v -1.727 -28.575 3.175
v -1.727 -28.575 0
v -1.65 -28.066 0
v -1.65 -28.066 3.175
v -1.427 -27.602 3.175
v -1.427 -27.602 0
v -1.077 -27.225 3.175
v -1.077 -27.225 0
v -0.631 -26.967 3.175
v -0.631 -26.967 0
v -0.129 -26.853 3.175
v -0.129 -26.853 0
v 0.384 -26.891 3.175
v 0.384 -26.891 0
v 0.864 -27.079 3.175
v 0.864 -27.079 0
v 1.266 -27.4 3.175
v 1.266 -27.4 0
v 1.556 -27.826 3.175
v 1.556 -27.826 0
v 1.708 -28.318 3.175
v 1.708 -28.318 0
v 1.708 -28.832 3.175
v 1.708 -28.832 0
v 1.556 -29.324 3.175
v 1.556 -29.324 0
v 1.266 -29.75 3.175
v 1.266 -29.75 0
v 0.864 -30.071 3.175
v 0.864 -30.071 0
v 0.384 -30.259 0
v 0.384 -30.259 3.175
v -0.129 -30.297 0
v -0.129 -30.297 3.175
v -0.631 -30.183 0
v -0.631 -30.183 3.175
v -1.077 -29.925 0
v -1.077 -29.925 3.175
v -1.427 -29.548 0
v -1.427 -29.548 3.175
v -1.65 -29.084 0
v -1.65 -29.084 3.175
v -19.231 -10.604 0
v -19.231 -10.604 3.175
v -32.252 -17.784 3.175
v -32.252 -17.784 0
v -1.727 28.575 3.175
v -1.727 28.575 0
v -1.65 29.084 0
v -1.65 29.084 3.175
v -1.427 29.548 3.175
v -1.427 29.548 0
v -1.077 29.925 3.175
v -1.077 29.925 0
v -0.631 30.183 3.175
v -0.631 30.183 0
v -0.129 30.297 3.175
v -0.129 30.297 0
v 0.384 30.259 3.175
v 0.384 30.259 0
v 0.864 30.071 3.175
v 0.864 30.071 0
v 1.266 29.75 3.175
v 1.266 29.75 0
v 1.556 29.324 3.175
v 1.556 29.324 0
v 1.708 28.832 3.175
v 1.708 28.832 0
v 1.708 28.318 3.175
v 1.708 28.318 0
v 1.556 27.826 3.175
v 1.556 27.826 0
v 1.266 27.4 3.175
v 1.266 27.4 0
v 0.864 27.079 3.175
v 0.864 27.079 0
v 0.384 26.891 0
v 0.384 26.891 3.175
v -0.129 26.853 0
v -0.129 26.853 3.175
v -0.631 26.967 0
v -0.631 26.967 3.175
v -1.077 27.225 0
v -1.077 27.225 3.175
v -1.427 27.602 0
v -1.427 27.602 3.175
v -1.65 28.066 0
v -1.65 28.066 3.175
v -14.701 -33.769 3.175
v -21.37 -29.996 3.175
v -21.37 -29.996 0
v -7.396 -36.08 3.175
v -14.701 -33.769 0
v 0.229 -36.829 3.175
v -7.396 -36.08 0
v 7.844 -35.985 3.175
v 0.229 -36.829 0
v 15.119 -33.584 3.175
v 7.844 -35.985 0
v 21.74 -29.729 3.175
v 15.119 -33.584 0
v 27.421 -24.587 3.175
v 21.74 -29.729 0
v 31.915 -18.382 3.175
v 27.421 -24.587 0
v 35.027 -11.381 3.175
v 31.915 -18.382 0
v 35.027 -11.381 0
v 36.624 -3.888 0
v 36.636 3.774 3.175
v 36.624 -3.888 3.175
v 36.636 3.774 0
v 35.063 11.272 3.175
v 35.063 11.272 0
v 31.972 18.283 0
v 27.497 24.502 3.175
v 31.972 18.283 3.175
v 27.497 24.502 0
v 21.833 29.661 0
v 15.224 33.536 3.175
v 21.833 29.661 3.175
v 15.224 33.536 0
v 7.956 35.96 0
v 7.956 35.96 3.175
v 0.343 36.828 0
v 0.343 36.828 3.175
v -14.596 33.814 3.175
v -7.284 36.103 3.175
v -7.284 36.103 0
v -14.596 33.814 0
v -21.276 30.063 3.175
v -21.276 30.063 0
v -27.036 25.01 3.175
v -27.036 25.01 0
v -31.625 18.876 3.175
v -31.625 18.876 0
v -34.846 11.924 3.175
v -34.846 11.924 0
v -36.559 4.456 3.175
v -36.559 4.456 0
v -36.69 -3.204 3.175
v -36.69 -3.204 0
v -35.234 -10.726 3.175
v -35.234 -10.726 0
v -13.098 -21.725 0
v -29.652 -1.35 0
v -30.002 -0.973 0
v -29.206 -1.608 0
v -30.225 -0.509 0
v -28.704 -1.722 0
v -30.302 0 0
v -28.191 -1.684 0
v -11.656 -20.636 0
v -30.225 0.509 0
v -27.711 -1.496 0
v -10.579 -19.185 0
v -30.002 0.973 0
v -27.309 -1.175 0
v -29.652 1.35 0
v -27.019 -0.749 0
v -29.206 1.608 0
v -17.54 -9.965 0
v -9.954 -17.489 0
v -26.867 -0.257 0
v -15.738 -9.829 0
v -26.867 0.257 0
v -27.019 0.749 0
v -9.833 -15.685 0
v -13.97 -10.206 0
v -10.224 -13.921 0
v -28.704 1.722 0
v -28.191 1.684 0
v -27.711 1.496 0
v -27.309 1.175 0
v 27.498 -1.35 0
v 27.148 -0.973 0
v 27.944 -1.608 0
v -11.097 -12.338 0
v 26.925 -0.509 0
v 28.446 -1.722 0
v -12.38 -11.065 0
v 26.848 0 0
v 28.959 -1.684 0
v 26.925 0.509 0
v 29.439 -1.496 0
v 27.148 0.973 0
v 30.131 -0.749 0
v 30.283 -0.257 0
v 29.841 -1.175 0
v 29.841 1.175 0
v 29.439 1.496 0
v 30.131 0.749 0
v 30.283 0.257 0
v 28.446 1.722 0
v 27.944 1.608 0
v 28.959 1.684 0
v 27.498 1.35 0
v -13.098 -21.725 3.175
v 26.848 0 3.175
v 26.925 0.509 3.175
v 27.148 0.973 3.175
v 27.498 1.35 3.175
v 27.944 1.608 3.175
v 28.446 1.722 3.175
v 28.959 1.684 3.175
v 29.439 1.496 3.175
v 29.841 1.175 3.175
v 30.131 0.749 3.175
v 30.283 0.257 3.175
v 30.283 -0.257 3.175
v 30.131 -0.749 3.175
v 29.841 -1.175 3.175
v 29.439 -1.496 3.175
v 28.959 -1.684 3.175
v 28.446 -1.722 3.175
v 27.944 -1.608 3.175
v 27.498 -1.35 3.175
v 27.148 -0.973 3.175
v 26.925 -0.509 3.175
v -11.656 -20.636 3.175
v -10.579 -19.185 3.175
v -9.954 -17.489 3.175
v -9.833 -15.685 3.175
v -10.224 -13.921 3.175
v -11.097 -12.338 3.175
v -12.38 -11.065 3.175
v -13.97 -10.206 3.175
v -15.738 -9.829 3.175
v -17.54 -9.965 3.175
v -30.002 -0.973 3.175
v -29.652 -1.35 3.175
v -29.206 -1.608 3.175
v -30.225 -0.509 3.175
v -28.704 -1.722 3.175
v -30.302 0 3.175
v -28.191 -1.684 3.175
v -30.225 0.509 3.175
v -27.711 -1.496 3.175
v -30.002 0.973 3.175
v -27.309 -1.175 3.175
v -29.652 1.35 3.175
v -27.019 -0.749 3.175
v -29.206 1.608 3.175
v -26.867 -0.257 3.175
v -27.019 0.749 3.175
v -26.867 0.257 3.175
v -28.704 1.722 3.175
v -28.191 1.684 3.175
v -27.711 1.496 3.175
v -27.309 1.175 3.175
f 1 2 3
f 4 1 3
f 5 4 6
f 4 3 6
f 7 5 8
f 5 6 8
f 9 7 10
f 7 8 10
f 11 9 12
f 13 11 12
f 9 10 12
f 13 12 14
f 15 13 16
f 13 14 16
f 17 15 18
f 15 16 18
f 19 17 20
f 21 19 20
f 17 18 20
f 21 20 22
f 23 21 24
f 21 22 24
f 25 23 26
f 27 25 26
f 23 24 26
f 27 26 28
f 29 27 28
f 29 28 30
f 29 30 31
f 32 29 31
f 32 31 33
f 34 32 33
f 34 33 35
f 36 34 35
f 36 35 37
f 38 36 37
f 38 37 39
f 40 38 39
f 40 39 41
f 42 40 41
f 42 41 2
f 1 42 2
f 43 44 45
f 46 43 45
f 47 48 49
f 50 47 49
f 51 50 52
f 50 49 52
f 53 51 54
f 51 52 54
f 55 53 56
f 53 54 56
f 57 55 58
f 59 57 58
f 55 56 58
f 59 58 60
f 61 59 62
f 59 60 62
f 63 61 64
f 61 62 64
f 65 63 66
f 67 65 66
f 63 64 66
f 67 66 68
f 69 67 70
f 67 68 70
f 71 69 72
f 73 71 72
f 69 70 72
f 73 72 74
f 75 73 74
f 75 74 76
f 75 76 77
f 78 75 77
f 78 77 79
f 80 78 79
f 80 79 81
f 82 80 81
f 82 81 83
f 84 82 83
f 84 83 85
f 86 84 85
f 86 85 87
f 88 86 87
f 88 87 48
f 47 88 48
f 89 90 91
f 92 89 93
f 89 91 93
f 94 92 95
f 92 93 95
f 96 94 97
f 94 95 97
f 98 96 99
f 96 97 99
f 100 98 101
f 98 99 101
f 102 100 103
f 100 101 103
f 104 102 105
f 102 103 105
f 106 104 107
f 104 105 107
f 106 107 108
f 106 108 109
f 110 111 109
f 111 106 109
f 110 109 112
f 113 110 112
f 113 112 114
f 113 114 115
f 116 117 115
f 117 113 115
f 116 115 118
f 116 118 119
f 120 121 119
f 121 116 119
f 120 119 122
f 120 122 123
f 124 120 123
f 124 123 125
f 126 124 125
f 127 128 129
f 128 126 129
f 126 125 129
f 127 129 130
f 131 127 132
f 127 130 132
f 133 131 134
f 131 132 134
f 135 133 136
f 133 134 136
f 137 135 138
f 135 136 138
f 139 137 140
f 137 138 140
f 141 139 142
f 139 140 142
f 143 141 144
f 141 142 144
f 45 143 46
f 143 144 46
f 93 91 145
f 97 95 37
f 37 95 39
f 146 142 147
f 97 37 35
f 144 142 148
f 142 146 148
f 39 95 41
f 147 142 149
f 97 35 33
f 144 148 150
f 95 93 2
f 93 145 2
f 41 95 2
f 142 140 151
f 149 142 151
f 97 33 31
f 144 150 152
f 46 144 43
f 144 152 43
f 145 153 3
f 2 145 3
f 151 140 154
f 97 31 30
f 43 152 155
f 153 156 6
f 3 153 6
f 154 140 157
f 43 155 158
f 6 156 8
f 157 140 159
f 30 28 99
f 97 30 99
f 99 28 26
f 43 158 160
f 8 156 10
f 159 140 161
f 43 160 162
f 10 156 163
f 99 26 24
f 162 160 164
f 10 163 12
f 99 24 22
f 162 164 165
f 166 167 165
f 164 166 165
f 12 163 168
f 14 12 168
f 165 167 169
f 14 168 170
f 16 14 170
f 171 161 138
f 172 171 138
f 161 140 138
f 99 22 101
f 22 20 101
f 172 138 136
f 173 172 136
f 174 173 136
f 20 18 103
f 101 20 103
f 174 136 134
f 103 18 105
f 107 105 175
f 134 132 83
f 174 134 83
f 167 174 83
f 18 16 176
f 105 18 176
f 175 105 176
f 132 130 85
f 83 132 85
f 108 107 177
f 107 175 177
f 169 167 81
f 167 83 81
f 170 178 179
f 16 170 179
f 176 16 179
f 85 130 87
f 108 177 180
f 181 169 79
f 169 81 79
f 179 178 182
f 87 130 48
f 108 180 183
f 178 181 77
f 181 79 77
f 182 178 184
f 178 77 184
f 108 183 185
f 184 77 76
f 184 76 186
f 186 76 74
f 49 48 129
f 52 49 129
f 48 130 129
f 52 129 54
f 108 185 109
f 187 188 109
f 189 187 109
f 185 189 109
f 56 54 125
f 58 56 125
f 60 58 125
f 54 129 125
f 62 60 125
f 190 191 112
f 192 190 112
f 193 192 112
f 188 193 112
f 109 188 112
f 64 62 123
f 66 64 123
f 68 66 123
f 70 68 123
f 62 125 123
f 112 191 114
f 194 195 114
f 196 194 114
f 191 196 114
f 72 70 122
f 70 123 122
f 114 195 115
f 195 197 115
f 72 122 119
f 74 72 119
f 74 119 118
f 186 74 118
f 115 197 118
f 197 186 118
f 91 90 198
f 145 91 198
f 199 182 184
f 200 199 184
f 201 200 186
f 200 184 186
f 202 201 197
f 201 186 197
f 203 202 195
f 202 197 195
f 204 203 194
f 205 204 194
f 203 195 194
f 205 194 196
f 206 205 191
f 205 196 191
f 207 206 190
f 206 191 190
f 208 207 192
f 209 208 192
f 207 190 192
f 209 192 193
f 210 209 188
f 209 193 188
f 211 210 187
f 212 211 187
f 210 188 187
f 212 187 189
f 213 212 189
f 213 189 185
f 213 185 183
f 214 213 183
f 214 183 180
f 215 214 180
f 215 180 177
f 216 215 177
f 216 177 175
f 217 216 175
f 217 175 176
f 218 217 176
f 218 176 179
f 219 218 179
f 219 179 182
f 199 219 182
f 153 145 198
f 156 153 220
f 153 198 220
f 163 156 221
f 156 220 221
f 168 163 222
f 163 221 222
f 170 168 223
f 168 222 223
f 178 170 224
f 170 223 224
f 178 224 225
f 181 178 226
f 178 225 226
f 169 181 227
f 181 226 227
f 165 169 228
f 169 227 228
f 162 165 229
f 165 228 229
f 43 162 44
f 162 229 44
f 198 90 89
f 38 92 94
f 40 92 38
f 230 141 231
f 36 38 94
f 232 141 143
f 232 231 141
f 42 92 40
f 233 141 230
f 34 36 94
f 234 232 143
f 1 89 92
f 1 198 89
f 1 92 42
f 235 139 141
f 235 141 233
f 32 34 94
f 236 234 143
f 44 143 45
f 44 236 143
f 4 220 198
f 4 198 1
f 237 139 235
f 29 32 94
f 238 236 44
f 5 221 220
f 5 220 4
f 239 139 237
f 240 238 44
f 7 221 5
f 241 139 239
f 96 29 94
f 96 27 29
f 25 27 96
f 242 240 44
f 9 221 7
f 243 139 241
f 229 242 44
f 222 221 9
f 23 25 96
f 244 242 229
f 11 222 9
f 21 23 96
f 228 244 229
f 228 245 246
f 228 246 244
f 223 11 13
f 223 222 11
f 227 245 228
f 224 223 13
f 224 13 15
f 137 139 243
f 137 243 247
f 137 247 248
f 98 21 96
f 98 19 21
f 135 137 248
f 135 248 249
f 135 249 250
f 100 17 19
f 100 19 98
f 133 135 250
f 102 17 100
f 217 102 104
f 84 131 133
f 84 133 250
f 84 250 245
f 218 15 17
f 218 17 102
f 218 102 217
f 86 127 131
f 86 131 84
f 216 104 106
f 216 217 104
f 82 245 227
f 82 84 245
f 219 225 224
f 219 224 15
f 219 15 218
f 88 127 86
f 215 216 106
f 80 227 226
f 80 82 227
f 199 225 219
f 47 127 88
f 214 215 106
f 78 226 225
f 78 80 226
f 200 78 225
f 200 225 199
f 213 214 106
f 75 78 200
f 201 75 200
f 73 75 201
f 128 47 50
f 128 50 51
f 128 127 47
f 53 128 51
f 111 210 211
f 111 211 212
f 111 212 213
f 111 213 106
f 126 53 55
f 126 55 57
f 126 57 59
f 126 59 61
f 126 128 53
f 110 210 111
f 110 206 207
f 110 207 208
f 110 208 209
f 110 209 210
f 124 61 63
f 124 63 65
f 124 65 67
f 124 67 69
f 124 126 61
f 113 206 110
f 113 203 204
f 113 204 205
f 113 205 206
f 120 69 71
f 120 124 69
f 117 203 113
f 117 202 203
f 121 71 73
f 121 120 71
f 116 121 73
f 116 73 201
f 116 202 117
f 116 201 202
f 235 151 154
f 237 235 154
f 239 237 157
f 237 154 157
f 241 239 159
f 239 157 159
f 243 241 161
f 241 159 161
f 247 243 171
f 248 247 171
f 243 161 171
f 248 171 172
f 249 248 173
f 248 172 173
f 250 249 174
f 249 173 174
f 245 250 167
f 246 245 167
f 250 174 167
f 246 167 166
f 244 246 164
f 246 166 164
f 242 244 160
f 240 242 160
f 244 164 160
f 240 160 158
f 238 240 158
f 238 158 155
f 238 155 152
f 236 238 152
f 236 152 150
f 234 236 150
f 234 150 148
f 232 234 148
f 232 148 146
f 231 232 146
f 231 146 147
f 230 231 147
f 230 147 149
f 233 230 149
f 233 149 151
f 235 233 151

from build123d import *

# Parameters (mm, degrees)
F0_R     = 36.83
F1_DEPTH = 3.175
F3_D     = 3.4544
F3_DEPTH = 11.43
F3_TIP   = 1.0378064612
F4_R     = 6.35
F5_DEPTH = 3.176
F7_DEPTH = 3.176


with BuildPart() as f1:
    # F0 (on Top) → F1 (new body)
    with BuildSketch(Plane.XY):
        Circle(F0_R)
    extrude(amount=F1_DEPTH)

    # F3
    with Locations(Plane.XY.offset(3.175)):
        with Locations((-28.575, 0), (0, 28.575), (28.575, 0), (0, -28.575)):
            Hole(F3_D / 2, depth=F3_DEPTH)
            with Locations((0, 0, -(F3_DEPTH + F3_TIP / 2))):  # 118° drill point
                Cone(0, F3_D / 2, F3_TIP, mode=Mode.SUBTRACT)

    # F4 (on face) → F5 (cut, through all)
    with BuildSketch(Plane.XY.offset(3.175)):
        with Locations((-16.1644610179, -16.1644610179)):
            Circle(F4_R)
    extrude(amount=-F5_DEPTH, mode=Mode.SUBTRACT)

    # F6 (on face) → F7 (cut, through all)
    with BuildSketch(Plane.XY.offset(3.175)):
        Polygon((-10.6037825397, -19.2306239069), (-19.2306239069, -10.6037825397), (-32.2519351736, -17.7837447563), (-39.33729292, -25.7967901035), (-21.3696253197, -29.9964666869), align=None)
    extrude(amount=-F7_DEPTH, mode=Mode.SUBTRACT)


solid = f1.part
